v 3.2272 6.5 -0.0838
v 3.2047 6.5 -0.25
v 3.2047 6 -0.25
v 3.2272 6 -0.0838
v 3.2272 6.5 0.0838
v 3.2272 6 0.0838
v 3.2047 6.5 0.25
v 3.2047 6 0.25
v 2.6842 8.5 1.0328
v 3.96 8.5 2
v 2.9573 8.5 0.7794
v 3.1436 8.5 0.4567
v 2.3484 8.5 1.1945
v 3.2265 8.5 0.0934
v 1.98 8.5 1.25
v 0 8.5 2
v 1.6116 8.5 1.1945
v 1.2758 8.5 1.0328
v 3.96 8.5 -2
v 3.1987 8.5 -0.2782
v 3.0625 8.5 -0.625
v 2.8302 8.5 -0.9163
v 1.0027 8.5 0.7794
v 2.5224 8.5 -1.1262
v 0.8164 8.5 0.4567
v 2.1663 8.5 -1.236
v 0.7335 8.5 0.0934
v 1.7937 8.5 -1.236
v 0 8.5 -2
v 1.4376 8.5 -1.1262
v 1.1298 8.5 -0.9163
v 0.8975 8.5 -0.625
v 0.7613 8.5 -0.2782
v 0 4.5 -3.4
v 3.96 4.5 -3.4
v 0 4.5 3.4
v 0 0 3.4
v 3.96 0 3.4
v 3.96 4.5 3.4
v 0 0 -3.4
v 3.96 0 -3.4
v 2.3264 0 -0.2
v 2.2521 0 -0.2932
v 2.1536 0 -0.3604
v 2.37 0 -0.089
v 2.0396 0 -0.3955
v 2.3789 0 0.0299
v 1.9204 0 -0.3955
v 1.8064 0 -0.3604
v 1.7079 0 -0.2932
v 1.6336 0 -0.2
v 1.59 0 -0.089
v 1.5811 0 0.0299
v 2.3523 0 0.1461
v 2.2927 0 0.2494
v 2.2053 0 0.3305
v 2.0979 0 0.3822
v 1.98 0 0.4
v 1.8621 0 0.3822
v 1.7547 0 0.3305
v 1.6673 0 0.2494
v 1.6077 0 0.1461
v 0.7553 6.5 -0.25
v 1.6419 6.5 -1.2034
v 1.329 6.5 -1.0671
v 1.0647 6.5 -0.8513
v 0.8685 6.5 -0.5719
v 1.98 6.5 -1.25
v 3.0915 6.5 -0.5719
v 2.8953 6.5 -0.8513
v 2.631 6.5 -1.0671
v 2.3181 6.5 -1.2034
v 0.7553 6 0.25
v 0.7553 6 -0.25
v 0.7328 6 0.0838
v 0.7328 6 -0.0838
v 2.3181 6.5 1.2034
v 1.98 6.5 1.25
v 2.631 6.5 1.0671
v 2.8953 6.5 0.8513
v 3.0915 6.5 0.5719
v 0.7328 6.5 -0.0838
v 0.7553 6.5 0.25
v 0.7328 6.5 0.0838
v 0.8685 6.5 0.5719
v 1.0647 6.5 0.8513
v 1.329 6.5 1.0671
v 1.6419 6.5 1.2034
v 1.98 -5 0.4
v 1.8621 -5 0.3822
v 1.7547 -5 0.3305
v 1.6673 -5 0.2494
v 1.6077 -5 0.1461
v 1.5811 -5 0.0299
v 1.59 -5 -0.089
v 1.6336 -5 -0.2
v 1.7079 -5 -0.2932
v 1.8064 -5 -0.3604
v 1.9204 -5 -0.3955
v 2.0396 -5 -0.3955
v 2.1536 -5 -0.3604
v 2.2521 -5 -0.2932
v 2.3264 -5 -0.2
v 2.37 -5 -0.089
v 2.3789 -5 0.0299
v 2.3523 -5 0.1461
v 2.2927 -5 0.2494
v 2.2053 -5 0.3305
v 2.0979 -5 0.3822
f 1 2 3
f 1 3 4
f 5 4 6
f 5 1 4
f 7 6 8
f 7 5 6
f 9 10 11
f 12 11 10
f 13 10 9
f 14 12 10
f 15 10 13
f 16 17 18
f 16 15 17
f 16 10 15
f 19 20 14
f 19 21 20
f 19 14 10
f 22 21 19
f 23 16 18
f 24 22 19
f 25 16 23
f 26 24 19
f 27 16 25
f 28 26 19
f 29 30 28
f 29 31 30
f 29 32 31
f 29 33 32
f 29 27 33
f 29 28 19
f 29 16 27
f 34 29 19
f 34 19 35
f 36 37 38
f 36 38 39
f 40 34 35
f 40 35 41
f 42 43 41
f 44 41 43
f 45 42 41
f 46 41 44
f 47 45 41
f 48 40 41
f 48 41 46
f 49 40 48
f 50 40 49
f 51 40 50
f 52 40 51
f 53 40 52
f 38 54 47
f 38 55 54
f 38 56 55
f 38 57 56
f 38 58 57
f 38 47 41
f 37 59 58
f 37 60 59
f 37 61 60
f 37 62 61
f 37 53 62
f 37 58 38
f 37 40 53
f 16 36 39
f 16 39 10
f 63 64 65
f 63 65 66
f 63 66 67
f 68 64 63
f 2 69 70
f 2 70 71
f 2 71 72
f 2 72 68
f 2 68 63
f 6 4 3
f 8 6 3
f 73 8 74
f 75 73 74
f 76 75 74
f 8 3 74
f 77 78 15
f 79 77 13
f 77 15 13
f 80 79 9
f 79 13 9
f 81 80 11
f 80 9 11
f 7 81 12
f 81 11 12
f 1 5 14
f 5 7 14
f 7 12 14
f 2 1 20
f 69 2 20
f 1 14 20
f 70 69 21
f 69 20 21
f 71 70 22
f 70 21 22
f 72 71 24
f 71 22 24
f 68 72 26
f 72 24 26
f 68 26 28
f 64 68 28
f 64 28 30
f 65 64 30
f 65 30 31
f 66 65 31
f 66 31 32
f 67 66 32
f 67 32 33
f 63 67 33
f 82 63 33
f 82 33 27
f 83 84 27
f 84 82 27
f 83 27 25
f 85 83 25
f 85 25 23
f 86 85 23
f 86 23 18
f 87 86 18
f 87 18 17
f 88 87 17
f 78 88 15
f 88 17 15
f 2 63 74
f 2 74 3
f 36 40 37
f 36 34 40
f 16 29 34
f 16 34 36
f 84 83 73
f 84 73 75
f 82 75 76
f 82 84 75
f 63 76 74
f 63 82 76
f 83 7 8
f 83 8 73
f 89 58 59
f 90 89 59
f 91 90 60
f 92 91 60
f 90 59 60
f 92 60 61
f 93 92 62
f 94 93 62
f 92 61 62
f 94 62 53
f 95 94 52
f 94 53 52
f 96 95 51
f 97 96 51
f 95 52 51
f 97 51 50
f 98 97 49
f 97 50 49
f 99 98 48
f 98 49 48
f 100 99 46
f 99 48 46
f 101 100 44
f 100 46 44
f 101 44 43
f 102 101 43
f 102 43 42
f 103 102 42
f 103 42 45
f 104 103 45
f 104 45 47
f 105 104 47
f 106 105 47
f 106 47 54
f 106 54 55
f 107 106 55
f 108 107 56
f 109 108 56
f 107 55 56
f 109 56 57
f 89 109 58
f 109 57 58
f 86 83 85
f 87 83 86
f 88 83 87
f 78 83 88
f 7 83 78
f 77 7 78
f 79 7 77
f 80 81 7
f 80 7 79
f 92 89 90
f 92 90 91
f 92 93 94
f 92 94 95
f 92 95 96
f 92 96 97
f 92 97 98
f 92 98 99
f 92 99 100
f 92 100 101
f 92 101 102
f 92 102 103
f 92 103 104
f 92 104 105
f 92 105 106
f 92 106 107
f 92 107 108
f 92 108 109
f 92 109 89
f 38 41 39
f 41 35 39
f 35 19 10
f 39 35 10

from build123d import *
from build123d.topology import SkipClean

# Parameters (mm, degrees)
EXTRUDE_1_DEPTH     = 3.96
SKETCH_3_R          = 1.25
CUT_EXTRUDE_1_DEPTH = 2
CUT_EXTRUDE_2_DEPTH = 0.5
SKETCH_5_R          = 0.4
EXTRUDE_2_DEPTH     = 5


with BuildPart() as part:
    # 草图1 → 凸台-拉伸1 (new body)
    with BuildSketch(Plane(origin=(0, 0, 0), x_dir=(0, 0, -1), z_dir=(1, 0, 0))):
        Polygon((3.4, 0), (-3.4, 0), (-3.4, 4.5), (-2, 8.5), (2, 8.5), (3.4, 4.5), align=None)
    extrude(amount=EXTRUDE_1_DEPTH)

    # 草图3 → 切除-拉伸1 (cut)
    with BuildSketch(Plane(origin=(0, 8.5, 0), x_dir=(1, 0, 0), z_dir=(0, 1, 0))):
        with Locations(Location((1.98, 0, 0), (0, 0, 270))):
            Circle(SKETCH_3_R)
    extrude(amount=-CUT_EXTRUDE_1_DEPTH, mode=Mode.SUBTRACT)

    # 草图4 → 切除-拉伸2 (cut)
    with SkipClean():  # the faces are left unmerged after this step: merging them gives an invalid solid
        with BuildSketch(Plane(origin=(0, 6.5, 0), x_dir=(1, 0, 0), z_dir=(0, 1, 0))):
            with BuildLine():
                Line((0.755255129, 0.25), (3.204744871, 0.25))
                ThreePointArc((3.204744871, 0.25), (3.23, 0), (3.204744871, -0.25))
                Line((3.204744871, -0.25), (0.755255129, -0.25))
                ThreePointArc((0.755255129, -0.25), (0.73, 0), (0.755255129, 0.25))
            make_face()
        extrude(amount=-CUT_EXTRUDE_2_DEPTH, mode=Mode.SUBTRACT)

    # 草图5 → 凸台-拉伸2 (add)
    with SkipClean():  # the faces are left unmerged after this step: merging them gives an invalid solid
        with BuildSketch(Plane.XZ):
            with Locations(Location((1.98, 0, 0), (0, 0, 90))):
                Circle(SKETCH_5_R)
        extrude(amount=EXTRUDE_2_DEPTH)


solid = part.part
